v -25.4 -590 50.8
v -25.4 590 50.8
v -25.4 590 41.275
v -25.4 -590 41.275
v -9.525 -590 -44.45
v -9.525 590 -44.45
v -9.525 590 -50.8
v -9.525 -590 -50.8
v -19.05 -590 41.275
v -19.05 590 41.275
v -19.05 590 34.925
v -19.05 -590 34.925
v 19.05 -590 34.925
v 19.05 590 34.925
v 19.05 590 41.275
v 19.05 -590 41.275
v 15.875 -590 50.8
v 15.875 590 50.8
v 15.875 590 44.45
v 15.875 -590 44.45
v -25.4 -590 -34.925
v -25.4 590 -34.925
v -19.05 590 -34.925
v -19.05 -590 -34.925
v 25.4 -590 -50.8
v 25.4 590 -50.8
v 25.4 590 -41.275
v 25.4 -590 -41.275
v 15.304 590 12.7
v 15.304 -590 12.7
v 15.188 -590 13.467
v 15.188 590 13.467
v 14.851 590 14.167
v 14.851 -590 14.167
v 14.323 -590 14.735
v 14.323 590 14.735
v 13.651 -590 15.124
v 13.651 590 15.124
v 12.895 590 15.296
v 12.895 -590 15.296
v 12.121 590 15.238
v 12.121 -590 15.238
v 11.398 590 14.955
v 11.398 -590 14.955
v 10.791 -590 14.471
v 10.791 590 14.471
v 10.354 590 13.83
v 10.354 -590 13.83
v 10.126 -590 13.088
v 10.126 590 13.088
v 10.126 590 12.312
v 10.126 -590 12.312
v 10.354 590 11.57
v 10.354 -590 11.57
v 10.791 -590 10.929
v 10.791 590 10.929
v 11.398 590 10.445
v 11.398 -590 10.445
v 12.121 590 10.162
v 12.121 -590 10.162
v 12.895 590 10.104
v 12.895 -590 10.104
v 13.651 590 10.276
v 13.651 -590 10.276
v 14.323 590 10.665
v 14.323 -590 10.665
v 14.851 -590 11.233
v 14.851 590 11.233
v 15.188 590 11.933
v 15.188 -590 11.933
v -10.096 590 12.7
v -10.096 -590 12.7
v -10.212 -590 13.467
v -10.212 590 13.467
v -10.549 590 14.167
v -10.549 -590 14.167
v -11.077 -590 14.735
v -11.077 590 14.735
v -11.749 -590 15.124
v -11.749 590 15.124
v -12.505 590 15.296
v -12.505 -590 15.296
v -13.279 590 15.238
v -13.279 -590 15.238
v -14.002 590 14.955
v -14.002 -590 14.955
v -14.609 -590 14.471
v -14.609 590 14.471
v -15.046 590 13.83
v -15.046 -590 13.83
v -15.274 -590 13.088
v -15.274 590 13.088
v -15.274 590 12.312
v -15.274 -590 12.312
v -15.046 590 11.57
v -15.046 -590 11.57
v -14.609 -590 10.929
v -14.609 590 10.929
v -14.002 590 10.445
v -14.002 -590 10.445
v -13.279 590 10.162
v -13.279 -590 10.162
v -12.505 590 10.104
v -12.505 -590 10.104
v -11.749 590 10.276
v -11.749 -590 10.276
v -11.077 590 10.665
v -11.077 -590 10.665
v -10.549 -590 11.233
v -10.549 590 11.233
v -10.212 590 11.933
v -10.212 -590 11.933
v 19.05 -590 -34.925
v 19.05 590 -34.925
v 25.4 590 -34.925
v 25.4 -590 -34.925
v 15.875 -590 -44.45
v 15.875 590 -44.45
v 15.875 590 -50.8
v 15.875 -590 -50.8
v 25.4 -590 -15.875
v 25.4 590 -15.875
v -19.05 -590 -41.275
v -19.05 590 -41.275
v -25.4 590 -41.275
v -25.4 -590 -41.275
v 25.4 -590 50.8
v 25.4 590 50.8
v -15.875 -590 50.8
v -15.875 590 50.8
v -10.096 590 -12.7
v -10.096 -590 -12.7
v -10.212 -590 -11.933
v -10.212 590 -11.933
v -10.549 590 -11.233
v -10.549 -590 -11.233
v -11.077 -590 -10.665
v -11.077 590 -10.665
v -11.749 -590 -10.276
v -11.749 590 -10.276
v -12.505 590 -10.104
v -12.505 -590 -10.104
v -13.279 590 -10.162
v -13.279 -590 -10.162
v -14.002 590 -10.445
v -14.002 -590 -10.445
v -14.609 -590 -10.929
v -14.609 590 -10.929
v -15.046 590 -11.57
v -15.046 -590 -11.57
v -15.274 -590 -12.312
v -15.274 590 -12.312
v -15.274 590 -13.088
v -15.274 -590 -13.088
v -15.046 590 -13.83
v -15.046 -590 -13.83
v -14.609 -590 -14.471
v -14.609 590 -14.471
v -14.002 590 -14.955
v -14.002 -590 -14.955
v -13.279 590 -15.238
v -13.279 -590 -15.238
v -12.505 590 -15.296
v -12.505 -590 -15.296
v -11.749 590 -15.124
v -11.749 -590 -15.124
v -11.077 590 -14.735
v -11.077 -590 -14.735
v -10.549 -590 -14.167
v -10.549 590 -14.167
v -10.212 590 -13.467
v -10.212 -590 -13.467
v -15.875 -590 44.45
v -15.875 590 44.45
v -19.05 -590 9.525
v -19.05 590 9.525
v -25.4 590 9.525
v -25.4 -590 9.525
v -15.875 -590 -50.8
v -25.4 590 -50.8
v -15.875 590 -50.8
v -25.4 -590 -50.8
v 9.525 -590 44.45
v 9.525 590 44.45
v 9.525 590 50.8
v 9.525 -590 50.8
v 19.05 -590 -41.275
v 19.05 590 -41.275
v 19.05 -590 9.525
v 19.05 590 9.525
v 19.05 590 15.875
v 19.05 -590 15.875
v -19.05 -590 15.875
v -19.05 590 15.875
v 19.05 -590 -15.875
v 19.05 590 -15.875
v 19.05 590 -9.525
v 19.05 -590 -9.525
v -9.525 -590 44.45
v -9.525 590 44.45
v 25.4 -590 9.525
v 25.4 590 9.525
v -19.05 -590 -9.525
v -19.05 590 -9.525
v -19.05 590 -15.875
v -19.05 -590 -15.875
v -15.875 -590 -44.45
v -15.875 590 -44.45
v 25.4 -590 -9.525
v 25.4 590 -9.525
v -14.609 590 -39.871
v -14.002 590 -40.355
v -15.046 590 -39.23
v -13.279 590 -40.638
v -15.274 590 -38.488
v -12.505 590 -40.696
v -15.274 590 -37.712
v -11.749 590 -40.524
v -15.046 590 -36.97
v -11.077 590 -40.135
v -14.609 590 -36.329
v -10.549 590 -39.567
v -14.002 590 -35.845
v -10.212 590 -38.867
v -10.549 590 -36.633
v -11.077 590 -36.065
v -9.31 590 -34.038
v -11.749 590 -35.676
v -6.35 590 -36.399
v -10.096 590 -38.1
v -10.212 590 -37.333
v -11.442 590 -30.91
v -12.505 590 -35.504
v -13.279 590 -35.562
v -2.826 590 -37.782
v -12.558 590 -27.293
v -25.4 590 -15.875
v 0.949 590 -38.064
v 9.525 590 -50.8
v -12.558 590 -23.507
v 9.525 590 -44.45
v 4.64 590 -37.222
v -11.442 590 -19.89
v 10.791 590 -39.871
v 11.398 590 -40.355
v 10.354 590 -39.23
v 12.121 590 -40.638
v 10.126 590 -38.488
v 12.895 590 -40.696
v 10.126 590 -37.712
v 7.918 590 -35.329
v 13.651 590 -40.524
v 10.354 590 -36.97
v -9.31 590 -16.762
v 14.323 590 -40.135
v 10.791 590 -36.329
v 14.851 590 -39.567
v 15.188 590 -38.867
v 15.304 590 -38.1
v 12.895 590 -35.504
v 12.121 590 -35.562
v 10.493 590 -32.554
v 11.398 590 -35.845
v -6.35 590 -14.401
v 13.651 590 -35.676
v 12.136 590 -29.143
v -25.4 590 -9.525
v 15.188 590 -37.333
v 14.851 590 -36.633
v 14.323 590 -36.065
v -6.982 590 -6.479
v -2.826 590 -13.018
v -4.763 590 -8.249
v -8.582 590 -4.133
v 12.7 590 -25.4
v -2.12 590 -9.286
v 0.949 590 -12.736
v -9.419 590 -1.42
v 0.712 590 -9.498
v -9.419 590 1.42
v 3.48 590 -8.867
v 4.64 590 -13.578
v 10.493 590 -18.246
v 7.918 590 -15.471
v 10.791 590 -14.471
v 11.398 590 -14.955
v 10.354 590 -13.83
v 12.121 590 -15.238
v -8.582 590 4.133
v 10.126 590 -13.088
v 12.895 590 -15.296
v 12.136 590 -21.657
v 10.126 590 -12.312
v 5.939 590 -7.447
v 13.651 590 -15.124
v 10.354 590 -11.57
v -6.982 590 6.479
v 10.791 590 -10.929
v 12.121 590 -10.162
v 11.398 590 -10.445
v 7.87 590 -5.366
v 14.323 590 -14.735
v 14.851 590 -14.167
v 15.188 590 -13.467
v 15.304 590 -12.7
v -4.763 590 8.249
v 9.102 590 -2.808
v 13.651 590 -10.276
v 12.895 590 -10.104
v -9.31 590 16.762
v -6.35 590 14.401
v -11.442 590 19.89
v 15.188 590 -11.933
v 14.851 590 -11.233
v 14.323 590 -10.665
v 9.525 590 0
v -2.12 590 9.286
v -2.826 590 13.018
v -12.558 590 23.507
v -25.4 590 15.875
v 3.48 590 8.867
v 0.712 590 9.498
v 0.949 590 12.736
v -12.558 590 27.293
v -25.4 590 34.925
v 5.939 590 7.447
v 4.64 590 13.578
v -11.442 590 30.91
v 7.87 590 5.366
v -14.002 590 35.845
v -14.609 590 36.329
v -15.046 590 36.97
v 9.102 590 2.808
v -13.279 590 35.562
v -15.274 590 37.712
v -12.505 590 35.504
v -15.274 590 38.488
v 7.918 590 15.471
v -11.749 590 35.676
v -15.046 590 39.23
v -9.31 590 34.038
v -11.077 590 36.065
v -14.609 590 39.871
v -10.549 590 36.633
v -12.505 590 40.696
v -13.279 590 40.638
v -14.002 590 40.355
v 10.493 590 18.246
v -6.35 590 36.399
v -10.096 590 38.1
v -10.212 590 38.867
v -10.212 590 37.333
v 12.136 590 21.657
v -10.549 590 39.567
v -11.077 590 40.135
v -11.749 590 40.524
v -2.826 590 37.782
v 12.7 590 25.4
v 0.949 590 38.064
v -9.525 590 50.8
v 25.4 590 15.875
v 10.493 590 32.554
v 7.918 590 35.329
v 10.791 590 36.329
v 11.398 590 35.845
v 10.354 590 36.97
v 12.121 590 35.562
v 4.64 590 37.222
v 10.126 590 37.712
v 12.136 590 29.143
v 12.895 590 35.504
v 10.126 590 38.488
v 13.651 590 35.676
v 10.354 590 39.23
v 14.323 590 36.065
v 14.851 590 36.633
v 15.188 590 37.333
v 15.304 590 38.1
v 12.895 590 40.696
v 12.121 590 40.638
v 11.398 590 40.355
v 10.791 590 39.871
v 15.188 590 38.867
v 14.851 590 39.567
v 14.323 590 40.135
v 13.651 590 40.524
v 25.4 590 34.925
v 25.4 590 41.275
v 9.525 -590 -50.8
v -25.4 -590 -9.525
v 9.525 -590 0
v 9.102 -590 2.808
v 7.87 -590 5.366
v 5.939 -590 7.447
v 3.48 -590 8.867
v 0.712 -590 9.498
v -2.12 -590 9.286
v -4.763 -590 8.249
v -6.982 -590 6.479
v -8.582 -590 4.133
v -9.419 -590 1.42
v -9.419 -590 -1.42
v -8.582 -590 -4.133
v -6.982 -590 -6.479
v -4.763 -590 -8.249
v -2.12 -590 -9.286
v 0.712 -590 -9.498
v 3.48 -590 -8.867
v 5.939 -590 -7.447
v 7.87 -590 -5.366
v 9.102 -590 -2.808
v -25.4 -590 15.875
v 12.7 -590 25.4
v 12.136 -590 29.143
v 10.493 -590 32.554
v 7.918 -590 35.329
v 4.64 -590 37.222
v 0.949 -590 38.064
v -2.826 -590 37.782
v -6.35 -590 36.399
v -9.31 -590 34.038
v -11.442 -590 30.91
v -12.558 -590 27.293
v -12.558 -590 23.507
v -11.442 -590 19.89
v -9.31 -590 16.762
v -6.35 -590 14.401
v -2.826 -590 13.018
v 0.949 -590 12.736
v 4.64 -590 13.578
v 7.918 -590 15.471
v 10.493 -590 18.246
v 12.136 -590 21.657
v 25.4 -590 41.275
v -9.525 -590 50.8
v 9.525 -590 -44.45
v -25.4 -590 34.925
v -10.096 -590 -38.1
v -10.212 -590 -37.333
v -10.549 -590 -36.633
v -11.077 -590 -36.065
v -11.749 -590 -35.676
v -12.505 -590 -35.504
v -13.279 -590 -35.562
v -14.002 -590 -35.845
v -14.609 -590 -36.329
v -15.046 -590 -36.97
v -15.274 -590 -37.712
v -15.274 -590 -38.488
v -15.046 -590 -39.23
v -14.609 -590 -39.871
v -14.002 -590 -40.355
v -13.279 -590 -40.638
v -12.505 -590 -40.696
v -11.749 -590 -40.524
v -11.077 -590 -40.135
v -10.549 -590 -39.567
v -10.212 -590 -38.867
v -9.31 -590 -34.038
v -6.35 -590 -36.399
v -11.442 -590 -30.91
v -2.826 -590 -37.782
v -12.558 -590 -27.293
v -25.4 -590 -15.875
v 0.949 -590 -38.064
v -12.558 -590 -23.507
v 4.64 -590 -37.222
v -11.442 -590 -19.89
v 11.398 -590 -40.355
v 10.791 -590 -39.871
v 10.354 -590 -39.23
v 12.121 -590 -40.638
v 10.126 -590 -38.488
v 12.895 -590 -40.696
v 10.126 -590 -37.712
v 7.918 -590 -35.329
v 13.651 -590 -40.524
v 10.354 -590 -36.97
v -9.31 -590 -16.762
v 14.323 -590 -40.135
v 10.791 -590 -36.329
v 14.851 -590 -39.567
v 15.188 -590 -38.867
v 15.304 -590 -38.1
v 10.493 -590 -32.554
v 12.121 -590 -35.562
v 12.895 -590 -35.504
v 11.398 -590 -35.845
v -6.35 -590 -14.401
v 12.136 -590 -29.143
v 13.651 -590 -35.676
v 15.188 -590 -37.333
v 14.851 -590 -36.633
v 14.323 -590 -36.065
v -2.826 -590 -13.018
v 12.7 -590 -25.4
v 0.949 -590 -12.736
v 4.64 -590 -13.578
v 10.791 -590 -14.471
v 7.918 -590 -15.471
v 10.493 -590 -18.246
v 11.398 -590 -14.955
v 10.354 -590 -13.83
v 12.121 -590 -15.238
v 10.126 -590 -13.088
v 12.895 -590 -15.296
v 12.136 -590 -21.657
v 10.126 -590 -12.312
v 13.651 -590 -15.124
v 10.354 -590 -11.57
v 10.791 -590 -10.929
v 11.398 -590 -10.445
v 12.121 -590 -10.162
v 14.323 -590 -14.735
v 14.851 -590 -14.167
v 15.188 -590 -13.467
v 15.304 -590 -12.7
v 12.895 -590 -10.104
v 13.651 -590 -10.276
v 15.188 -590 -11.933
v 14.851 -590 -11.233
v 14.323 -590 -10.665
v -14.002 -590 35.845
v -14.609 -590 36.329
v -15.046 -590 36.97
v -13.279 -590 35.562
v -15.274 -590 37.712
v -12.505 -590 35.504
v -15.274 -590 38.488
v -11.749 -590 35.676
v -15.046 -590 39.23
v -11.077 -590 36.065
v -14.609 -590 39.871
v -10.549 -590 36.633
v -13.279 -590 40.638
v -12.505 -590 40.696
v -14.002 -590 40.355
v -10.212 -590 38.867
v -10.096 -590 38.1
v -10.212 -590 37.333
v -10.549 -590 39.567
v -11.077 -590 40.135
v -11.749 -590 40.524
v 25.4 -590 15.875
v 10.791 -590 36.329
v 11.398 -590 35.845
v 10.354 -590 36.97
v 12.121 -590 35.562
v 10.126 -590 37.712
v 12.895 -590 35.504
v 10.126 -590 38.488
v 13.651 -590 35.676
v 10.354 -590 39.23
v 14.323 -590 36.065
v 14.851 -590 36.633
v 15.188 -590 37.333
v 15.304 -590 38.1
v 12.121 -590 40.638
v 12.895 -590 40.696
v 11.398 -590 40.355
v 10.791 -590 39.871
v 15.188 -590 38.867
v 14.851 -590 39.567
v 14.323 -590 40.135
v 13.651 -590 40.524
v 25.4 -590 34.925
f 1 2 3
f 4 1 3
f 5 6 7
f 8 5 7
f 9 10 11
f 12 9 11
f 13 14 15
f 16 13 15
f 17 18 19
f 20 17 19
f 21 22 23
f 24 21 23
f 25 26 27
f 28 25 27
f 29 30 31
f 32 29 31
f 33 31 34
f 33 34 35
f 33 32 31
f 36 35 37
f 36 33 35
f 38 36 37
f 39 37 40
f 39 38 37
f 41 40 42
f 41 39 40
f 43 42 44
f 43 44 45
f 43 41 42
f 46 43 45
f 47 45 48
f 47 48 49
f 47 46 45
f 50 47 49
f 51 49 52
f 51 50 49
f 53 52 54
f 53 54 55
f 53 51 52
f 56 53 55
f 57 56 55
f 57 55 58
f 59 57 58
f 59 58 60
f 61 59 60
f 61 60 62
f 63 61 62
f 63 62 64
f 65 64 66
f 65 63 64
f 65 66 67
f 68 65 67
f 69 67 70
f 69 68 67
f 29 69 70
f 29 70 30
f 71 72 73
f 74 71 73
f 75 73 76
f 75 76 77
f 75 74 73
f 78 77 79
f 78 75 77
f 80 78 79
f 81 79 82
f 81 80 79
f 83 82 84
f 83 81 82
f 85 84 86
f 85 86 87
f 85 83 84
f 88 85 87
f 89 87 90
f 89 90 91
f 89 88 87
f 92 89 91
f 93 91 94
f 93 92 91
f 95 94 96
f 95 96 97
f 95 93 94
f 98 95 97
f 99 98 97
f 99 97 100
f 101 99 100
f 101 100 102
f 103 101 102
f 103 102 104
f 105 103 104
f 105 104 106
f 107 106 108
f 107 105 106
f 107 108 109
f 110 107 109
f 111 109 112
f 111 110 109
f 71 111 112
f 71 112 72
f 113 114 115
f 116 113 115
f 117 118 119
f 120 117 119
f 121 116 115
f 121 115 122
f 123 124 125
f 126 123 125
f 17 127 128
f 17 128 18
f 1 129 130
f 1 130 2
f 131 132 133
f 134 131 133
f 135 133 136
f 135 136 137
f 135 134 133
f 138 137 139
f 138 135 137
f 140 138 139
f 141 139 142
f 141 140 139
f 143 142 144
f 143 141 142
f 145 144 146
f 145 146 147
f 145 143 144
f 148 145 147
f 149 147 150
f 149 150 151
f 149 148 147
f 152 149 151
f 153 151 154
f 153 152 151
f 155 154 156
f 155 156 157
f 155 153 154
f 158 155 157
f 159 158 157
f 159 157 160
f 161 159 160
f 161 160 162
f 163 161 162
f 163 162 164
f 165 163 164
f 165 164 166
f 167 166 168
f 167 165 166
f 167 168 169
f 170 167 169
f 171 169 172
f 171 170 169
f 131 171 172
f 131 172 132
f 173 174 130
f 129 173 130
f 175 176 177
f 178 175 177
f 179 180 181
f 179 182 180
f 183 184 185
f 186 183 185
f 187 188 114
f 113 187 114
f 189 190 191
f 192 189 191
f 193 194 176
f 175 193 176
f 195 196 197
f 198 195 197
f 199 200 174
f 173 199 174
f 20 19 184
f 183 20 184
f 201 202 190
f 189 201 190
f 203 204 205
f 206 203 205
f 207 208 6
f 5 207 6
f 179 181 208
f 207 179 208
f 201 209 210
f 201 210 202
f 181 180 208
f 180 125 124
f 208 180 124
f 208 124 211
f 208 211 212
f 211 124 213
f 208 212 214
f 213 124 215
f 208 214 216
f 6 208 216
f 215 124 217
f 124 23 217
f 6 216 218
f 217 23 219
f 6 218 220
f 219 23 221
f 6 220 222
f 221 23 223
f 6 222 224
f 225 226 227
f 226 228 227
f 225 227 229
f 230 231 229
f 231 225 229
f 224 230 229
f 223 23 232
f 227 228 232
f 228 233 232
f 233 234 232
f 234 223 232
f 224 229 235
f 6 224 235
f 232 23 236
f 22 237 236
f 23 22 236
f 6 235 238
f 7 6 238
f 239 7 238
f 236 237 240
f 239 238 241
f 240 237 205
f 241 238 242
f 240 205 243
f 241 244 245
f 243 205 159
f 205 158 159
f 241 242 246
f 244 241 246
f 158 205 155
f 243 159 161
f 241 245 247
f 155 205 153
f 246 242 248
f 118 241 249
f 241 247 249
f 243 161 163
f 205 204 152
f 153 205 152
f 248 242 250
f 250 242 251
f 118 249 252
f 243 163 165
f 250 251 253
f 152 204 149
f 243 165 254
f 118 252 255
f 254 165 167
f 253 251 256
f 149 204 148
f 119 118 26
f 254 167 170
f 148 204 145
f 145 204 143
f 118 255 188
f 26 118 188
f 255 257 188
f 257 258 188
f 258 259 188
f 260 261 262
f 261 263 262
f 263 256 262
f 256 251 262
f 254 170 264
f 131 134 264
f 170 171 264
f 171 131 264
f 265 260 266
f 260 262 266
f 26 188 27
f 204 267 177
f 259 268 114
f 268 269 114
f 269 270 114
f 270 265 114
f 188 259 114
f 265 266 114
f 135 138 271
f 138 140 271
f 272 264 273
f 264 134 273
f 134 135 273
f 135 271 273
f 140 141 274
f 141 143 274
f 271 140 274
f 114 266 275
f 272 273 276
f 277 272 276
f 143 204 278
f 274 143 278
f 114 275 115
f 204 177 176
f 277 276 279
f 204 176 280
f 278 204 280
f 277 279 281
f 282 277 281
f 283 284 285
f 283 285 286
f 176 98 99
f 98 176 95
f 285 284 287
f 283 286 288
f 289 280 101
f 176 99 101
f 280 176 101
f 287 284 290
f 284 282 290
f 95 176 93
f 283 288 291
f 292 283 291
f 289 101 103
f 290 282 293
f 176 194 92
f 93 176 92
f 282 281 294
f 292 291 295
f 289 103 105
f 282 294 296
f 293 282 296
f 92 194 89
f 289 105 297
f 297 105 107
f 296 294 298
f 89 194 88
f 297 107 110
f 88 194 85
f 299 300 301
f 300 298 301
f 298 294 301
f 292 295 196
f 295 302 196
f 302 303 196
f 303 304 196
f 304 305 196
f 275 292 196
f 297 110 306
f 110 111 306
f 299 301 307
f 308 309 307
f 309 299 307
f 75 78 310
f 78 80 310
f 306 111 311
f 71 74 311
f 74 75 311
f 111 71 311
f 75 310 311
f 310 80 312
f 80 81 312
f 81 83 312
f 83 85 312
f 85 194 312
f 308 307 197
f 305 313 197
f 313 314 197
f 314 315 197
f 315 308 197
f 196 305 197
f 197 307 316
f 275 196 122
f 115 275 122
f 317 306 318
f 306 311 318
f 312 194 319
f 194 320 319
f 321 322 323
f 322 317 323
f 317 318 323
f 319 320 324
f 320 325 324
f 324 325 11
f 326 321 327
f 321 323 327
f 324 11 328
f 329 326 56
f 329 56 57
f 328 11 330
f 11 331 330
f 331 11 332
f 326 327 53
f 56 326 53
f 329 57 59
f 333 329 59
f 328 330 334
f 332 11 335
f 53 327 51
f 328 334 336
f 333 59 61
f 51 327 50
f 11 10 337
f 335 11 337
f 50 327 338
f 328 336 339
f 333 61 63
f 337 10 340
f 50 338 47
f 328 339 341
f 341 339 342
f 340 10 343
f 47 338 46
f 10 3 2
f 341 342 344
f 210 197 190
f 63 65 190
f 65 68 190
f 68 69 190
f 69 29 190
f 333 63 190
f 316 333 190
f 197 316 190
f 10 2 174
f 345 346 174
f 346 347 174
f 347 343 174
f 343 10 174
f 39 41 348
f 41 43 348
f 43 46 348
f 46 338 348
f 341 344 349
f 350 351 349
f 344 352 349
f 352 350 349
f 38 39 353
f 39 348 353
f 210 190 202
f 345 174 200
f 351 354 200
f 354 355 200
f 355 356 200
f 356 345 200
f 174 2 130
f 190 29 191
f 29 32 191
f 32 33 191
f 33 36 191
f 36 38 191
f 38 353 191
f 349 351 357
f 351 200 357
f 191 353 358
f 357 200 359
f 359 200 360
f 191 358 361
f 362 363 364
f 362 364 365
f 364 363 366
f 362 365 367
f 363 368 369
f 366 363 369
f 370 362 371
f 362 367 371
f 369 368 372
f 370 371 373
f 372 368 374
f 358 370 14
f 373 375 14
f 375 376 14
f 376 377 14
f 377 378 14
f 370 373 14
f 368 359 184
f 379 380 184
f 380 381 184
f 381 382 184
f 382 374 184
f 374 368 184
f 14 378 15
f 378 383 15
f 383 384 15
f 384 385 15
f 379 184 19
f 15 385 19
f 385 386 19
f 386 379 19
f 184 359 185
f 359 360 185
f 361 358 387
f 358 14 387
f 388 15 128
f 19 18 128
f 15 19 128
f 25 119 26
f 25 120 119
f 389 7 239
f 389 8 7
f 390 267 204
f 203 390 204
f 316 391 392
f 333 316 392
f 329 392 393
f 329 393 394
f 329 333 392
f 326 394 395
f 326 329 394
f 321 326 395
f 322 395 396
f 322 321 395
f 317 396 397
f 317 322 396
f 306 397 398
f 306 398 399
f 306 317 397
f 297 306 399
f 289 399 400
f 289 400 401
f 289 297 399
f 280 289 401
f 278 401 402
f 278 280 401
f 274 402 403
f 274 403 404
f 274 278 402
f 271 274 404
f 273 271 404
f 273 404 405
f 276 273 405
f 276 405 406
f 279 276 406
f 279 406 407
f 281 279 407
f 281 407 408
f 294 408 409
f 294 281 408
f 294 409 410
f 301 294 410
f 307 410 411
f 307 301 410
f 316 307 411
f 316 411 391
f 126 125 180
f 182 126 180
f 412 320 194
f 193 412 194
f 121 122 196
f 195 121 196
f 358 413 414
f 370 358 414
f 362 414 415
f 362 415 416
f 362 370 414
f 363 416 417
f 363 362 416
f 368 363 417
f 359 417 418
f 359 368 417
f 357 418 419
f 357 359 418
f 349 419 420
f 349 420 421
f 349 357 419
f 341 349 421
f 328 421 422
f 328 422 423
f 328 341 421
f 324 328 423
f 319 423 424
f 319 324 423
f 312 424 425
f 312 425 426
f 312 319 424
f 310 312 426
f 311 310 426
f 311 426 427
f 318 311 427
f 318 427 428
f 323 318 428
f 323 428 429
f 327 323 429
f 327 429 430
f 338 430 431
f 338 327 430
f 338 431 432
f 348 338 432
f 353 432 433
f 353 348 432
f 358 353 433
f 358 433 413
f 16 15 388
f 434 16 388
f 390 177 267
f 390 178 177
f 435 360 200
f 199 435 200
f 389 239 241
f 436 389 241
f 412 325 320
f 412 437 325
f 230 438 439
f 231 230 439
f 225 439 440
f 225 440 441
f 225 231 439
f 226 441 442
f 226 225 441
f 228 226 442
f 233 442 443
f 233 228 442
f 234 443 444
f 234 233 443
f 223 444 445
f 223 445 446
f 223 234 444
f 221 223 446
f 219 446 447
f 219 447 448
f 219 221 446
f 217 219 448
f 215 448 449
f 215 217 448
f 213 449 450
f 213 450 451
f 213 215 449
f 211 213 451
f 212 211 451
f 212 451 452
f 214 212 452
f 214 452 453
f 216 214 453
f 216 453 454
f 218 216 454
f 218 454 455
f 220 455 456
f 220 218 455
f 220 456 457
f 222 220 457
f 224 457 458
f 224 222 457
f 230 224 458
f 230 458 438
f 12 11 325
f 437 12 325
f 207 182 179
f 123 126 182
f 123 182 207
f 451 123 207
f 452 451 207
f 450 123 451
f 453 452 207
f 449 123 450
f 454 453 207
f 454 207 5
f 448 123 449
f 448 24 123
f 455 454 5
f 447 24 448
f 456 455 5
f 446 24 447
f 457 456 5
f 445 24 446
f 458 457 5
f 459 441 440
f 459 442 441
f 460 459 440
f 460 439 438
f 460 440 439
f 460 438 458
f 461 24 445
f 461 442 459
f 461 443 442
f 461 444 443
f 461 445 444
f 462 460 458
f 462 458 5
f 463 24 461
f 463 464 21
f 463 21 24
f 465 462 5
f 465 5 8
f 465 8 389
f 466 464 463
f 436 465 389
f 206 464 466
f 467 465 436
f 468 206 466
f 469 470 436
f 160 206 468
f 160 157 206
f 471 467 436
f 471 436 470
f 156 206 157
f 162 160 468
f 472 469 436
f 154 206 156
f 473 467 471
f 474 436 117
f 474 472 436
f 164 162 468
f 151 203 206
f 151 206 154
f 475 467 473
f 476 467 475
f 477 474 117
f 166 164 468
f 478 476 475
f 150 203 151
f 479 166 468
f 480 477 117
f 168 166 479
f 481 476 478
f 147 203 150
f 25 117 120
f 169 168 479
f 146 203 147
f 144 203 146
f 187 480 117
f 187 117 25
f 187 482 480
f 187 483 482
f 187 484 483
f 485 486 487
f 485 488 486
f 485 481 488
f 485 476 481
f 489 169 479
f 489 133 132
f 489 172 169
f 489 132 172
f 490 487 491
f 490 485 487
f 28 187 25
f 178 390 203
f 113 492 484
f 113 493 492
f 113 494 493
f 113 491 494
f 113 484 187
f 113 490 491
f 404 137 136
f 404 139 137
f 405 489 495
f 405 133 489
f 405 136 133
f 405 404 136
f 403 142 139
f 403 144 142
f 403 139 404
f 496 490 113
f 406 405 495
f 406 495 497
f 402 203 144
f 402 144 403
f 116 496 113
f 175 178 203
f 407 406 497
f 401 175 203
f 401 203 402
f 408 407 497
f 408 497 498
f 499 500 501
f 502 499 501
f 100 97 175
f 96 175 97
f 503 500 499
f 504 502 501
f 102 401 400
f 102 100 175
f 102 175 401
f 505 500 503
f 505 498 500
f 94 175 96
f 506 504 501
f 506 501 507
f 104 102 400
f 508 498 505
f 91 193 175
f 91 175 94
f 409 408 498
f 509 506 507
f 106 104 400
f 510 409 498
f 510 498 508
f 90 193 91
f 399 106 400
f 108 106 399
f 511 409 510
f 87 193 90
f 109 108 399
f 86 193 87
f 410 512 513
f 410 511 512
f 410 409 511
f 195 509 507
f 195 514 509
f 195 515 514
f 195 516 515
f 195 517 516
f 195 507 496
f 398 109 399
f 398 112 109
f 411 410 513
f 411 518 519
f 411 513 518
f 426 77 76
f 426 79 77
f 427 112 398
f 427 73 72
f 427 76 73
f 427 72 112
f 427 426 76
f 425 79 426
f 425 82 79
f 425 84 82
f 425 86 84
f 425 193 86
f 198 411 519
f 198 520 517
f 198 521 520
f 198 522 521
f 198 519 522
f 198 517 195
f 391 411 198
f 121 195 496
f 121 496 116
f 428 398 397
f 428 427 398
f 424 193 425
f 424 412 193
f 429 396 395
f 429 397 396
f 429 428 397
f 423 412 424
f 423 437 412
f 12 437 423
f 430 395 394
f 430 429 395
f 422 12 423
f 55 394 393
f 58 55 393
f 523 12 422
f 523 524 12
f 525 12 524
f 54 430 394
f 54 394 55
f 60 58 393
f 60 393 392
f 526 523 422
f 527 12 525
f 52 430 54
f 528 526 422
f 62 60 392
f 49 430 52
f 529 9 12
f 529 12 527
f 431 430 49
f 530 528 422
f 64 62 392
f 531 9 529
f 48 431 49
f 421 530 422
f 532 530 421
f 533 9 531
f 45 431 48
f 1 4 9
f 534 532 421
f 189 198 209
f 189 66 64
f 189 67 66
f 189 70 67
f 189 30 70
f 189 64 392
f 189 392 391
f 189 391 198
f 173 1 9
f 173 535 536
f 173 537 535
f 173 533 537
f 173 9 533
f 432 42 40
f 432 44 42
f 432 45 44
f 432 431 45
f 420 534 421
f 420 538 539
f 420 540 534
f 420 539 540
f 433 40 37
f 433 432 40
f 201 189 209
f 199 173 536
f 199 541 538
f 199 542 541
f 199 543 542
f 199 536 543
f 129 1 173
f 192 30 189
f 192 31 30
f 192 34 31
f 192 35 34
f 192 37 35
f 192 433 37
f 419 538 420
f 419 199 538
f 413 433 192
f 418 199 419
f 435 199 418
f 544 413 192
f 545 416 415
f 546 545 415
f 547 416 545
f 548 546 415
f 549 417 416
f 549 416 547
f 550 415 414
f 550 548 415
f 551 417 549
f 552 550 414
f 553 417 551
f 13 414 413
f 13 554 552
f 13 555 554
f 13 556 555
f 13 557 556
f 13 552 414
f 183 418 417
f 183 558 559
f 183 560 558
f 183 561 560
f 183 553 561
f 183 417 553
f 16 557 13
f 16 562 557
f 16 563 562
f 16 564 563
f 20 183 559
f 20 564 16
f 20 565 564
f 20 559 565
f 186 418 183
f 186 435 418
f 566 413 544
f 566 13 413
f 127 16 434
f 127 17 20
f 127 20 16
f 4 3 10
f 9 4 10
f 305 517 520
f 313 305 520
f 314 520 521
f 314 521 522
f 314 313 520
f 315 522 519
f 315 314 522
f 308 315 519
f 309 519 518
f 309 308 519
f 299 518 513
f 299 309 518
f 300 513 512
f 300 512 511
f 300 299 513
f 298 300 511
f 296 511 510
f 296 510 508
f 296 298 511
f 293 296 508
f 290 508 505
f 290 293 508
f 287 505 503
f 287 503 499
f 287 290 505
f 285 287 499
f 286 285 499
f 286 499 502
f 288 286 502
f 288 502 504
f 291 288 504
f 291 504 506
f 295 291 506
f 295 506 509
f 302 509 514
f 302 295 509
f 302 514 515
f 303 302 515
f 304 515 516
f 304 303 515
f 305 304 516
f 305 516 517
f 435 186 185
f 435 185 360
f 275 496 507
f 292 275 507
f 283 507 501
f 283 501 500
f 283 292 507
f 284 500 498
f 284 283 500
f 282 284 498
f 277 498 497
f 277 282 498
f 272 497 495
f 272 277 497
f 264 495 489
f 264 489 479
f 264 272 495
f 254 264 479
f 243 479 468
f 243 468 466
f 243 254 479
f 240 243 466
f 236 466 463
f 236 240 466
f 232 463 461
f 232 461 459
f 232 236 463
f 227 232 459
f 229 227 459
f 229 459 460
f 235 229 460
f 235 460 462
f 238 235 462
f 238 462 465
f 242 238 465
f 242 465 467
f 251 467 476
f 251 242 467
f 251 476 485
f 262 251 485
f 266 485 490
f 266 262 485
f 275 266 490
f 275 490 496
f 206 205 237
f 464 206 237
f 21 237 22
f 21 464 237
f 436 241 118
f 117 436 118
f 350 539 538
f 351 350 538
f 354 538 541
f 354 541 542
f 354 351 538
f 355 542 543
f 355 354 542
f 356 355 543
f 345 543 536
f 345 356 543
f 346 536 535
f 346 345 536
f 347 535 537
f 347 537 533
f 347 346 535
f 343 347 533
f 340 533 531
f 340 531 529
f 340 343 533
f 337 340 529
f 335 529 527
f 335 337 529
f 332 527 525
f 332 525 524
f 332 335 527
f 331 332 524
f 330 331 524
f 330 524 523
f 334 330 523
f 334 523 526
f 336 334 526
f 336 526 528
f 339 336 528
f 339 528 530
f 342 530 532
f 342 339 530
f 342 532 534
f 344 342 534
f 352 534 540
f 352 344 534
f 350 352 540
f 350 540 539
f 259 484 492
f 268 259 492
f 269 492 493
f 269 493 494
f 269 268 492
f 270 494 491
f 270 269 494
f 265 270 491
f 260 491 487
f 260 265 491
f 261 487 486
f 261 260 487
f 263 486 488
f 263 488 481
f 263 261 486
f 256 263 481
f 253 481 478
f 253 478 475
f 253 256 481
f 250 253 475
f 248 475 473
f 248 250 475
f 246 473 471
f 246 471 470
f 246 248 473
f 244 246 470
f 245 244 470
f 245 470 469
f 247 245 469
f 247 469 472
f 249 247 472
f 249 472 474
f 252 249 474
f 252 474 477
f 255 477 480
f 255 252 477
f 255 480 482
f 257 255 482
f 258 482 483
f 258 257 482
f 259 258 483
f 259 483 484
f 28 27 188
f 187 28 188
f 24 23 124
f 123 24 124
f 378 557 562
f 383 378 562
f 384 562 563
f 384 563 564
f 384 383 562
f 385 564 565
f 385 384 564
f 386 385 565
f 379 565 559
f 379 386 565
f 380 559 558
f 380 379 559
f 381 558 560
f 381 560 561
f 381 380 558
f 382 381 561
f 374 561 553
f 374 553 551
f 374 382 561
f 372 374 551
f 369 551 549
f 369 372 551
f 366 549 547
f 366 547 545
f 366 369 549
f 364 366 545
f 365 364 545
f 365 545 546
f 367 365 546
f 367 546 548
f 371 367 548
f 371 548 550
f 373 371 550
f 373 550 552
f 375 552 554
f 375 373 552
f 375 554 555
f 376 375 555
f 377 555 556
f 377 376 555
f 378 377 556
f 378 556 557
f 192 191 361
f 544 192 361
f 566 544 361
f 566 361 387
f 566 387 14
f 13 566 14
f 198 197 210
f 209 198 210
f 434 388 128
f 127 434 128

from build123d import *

# Parameters (mm, degrees)
F0_R     = 2.6035
F0_R_2   = 12.7
F0_R_3   = 9.525
F1_DEPTH = 590


with BuildPart() as f1:
    # F0 (on Front) → F1 (new body, symmetric)
    with BuildSketch(Plane.XZ):
        Polygon((15.875, -50.8), (25.4, -50.8), (25.4, -41.275), (19.05, -41.275), (19.05, -34.925), (25.4, -34.925), (25.4, -15.875), (19.05, -15.875), (19.05, -9.525), (25.4, -9.525), (25.4, 9.525), (19.05, 9.525), (19.05, 15.875), (25.4, 15.875), (25.4, 34.925), (19.05, 34.925), (19.05, 41.275), (25.4, 41.275), (25.4, 50.8), (15.875, 50.8), (15.875, 44.45), (9.525, 44.45), (9.525, 50.8), (-9.525, 50.8), (-9.525, 44.45), (-15.875, 44.45), (-15.875, 50.8), (-25.4, 50.8), (-25.4, 41.275), (-19.05, 41.275), (-19.05, 34.925), (-25.4, 34.925), (-25.4, 15.875), (-19.05, 15.875), (-19.05, 9.525), (-25.4, 9.525), (-25.4, -9.525), (-19.05, -9.525), (-19.05, -15.875), (-25.4, -15.875), (-25.4, -34.925), (-19.05, -34.925), (-19.05, -41.275), (-25.4, -41.275), (-25.4, -50.8), (-15.875, -50.8), (-15.875, -44.45), (-9.525, -44.45), (-9.525, -50.8), (9.525, -50.8), (9.525, -44.45), (15.875, -44.45), align=None)
        with Locations((-12.7, -38.1)):
            Circle(F0_R, mode=Mode.SUBTRACT)
        with Locations((0, -25.4)):
            Circle(F0_R_2, mode=Mode.SUBTRACT)
        with Locations((-12.7, -12.7)):
            Circle(F0_R, mode=Mode.SUBTRACT)
        Circle(F0_R_3, mode=Mode.SUBTRACT)
        with Locations((12.7, -38.1)):
            Circle(F0_R, mode=Mode.SUBTRACT)
        with Locations((12.7, -12.7)):
            Circle(F0_R, mode=Mode.SUBTRACT)
        with Locations((-12.7, 12.7)):
            Circle(F0_R, mode=Mode.SUBTRACT)
        with Locations((0, 25.4)):
            Circle(F0_R_2, mode=Mode.SUBTRACT)
        with Locations((-12.7, 38.1)):
            Circle(F0_R, mode=Mode.SUBTRACT)
        with Locations((12.7, 12.7)):
            Circle(F0_R, mode=Mode.SUBTRACT)
        with Locations((12.7, 38.1)):
            Circle(F0_R, mode=Mode.SUBTRACT)
    extrude(amount=F1_DEPTH, both=True)


solid = f1.part
